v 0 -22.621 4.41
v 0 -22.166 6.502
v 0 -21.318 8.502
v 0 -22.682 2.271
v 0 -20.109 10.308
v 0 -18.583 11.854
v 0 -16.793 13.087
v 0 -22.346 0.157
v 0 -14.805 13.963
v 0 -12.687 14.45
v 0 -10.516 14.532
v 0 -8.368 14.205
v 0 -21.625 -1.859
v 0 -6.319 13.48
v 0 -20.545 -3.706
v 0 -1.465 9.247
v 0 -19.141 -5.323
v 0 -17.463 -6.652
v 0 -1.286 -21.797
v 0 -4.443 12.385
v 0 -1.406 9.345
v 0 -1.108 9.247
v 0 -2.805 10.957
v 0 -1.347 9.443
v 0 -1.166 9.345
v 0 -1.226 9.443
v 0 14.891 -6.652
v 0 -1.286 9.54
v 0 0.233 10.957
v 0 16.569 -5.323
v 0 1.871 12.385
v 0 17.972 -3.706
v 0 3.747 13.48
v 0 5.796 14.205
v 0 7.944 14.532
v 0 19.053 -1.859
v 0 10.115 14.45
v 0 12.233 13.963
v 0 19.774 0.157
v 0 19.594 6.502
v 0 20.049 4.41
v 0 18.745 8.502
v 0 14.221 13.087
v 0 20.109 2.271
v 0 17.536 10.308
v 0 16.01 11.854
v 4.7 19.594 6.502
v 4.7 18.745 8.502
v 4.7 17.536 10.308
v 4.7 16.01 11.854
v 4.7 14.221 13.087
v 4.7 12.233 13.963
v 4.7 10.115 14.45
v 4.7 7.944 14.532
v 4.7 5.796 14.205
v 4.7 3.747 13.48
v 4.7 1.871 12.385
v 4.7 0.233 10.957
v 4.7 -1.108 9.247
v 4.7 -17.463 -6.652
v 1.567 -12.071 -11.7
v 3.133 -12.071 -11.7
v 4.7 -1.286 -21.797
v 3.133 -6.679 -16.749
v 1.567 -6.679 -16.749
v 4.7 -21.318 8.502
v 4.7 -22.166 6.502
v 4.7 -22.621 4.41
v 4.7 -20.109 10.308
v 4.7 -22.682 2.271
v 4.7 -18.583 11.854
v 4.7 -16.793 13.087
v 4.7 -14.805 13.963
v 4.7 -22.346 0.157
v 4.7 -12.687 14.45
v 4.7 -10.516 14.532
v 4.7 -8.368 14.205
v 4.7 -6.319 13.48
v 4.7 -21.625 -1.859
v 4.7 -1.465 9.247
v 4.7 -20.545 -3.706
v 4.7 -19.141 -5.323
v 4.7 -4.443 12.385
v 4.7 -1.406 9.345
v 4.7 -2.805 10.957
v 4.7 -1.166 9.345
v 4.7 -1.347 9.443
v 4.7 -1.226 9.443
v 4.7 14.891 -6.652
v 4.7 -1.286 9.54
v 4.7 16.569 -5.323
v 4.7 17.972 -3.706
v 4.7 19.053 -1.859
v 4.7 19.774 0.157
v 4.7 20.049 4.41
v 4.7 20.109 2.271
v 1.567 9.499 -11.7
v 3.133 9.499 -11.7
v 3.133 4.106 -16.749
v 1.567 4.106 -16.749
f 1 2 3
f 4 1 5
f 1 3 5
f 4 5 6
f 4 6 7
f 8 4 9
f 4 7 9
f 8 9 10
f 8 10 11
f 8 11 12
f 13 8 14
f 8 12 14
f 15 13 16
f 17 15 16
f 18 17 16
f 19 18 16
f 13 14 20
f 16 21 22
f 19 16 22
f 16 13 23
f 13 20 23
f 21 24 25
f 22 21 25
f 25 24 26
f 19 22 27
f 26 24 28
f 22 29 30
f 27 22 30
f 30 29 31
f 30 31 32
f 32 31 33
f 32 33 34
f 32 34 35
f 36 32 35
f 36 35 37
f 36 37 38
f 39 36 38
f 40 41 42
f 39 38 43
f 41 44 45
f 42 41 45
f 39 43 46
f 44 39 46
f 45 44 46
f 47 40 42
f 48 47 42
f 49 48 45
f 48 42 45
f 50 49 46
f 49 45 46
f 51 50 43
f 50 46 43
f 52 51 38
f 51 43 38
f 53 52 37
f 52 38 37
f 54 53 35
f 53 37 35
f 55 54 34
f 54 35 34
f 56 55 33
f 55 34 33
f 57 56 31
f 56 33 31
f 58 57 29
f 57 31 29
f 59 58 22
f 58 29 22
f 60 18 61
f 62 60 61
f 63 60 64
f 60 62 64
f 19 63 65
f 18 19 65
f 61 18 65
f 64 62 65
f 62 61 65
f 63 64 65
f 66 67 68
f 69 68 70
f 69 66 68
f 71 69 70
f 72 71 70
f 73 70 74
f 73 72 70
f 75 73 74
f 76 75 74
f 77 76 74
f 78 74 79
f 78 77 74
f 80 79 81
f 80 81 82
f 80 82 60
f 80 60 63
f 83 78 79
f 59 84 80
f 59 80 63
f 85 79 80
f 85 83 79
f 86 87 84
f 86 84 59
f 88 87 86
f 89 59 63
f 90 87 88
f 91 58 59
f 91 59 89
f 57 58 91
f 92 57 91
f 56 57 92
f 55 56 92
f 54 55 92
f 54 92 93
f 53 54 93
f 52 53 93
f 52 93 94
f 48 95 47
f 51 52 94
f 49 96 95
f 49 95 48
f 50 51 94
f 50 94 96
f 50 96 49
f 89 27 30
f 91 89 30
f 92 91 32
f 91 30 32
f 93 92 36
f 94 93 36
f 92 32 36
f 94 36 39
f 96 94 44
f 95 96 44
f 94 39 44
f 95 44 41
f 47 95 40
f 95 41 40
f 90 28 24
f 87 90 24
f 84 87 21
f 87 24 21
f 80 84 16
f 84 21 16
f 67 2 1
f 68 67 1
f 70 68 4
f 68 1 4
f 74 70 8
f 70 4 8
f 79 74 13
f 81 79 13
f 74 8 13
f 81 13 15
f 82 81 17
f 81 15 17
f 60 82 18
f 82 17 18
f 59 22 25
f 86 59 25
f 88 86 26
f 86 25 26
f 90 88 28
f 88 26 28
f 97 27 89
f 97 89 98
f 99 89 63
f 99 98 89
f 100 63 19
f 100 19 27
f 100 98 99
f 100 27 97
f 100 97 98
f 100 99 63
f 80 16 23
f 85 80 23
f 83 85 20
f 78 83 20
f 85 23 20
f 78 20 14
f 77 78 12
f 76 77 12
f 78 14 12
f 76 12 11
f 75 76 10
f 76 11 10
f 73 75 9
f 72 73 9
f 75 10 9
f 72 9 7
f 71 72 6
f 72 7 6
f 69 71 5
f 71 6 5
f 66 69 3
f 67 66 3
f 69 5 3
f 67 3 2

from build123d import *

# Parameters (mm, degrees)
F1_DEPTH = 4.7


# Not quite as in the source:
# - ends of sketch curves that miss each other by under 0.0002 mm in the source are joined


with BuildPart() as f1:
    # F0 (on Right) → F1 (new body)
    with BuildSketch(Plane.YZ):
        with BuildLine():
            ThreePointArc((-1.2861936627, 9.5404589046), (-1.3764412196, 9.3943245755), (-1.4645028348, 9.2468626631))
            ThreePointArc((-1.4645028348, 9.2468626631), (-12.6873926867, 14.4502544968), (-22.1664207404, 6.501885459))
            ThreePointArc((-22.1664207404, 6.501885459), (-22.0324514747, -0.8678048449), (-17.463284327, -6.6516612154))
            add(Edge.make_bspline(
                [(-17.463284327, -6.6516612154), (-12.0709199928, -11.7001523748), (-6.6785564381, -16.7486430269), (-1.2861928833, -21.797133679)],
                knots=[0, 0, 0, 0, 22.160405753, 22.160405753, 22.160405753, 22.160405753], degree=3))
            add(Edge.make_bspline(
                [(14.8908962222, -6.6516617227), (9.4985326674, -11.7001523748), (4.1061691126, -16.7486430269), (-1.2861928833, -21.797133679)],
                knots=[0, 0, 0, 0, 22.160405753, 22.160405753, 22.160405753, 22.160405753], degree=3))
            ThreePointArc((14.8908962222, -6.6516617227), (19.4600641493, -0.8678048449), (19.594033415, 6.501885459))
            ThreePointArc((19.594033415, 6.501885459), (10.1150053613, 14.4502544968), (-1.1078844907, 9.2468626631))
            ThreePointArc((-1.1078844907, 9.2468626631), (-1.1959461058, 9.3943245755), (-1.2861936627, 9.5404589046))
        make_face()
    extrude(amount=F1_DEPTH)


solid = f1.part
